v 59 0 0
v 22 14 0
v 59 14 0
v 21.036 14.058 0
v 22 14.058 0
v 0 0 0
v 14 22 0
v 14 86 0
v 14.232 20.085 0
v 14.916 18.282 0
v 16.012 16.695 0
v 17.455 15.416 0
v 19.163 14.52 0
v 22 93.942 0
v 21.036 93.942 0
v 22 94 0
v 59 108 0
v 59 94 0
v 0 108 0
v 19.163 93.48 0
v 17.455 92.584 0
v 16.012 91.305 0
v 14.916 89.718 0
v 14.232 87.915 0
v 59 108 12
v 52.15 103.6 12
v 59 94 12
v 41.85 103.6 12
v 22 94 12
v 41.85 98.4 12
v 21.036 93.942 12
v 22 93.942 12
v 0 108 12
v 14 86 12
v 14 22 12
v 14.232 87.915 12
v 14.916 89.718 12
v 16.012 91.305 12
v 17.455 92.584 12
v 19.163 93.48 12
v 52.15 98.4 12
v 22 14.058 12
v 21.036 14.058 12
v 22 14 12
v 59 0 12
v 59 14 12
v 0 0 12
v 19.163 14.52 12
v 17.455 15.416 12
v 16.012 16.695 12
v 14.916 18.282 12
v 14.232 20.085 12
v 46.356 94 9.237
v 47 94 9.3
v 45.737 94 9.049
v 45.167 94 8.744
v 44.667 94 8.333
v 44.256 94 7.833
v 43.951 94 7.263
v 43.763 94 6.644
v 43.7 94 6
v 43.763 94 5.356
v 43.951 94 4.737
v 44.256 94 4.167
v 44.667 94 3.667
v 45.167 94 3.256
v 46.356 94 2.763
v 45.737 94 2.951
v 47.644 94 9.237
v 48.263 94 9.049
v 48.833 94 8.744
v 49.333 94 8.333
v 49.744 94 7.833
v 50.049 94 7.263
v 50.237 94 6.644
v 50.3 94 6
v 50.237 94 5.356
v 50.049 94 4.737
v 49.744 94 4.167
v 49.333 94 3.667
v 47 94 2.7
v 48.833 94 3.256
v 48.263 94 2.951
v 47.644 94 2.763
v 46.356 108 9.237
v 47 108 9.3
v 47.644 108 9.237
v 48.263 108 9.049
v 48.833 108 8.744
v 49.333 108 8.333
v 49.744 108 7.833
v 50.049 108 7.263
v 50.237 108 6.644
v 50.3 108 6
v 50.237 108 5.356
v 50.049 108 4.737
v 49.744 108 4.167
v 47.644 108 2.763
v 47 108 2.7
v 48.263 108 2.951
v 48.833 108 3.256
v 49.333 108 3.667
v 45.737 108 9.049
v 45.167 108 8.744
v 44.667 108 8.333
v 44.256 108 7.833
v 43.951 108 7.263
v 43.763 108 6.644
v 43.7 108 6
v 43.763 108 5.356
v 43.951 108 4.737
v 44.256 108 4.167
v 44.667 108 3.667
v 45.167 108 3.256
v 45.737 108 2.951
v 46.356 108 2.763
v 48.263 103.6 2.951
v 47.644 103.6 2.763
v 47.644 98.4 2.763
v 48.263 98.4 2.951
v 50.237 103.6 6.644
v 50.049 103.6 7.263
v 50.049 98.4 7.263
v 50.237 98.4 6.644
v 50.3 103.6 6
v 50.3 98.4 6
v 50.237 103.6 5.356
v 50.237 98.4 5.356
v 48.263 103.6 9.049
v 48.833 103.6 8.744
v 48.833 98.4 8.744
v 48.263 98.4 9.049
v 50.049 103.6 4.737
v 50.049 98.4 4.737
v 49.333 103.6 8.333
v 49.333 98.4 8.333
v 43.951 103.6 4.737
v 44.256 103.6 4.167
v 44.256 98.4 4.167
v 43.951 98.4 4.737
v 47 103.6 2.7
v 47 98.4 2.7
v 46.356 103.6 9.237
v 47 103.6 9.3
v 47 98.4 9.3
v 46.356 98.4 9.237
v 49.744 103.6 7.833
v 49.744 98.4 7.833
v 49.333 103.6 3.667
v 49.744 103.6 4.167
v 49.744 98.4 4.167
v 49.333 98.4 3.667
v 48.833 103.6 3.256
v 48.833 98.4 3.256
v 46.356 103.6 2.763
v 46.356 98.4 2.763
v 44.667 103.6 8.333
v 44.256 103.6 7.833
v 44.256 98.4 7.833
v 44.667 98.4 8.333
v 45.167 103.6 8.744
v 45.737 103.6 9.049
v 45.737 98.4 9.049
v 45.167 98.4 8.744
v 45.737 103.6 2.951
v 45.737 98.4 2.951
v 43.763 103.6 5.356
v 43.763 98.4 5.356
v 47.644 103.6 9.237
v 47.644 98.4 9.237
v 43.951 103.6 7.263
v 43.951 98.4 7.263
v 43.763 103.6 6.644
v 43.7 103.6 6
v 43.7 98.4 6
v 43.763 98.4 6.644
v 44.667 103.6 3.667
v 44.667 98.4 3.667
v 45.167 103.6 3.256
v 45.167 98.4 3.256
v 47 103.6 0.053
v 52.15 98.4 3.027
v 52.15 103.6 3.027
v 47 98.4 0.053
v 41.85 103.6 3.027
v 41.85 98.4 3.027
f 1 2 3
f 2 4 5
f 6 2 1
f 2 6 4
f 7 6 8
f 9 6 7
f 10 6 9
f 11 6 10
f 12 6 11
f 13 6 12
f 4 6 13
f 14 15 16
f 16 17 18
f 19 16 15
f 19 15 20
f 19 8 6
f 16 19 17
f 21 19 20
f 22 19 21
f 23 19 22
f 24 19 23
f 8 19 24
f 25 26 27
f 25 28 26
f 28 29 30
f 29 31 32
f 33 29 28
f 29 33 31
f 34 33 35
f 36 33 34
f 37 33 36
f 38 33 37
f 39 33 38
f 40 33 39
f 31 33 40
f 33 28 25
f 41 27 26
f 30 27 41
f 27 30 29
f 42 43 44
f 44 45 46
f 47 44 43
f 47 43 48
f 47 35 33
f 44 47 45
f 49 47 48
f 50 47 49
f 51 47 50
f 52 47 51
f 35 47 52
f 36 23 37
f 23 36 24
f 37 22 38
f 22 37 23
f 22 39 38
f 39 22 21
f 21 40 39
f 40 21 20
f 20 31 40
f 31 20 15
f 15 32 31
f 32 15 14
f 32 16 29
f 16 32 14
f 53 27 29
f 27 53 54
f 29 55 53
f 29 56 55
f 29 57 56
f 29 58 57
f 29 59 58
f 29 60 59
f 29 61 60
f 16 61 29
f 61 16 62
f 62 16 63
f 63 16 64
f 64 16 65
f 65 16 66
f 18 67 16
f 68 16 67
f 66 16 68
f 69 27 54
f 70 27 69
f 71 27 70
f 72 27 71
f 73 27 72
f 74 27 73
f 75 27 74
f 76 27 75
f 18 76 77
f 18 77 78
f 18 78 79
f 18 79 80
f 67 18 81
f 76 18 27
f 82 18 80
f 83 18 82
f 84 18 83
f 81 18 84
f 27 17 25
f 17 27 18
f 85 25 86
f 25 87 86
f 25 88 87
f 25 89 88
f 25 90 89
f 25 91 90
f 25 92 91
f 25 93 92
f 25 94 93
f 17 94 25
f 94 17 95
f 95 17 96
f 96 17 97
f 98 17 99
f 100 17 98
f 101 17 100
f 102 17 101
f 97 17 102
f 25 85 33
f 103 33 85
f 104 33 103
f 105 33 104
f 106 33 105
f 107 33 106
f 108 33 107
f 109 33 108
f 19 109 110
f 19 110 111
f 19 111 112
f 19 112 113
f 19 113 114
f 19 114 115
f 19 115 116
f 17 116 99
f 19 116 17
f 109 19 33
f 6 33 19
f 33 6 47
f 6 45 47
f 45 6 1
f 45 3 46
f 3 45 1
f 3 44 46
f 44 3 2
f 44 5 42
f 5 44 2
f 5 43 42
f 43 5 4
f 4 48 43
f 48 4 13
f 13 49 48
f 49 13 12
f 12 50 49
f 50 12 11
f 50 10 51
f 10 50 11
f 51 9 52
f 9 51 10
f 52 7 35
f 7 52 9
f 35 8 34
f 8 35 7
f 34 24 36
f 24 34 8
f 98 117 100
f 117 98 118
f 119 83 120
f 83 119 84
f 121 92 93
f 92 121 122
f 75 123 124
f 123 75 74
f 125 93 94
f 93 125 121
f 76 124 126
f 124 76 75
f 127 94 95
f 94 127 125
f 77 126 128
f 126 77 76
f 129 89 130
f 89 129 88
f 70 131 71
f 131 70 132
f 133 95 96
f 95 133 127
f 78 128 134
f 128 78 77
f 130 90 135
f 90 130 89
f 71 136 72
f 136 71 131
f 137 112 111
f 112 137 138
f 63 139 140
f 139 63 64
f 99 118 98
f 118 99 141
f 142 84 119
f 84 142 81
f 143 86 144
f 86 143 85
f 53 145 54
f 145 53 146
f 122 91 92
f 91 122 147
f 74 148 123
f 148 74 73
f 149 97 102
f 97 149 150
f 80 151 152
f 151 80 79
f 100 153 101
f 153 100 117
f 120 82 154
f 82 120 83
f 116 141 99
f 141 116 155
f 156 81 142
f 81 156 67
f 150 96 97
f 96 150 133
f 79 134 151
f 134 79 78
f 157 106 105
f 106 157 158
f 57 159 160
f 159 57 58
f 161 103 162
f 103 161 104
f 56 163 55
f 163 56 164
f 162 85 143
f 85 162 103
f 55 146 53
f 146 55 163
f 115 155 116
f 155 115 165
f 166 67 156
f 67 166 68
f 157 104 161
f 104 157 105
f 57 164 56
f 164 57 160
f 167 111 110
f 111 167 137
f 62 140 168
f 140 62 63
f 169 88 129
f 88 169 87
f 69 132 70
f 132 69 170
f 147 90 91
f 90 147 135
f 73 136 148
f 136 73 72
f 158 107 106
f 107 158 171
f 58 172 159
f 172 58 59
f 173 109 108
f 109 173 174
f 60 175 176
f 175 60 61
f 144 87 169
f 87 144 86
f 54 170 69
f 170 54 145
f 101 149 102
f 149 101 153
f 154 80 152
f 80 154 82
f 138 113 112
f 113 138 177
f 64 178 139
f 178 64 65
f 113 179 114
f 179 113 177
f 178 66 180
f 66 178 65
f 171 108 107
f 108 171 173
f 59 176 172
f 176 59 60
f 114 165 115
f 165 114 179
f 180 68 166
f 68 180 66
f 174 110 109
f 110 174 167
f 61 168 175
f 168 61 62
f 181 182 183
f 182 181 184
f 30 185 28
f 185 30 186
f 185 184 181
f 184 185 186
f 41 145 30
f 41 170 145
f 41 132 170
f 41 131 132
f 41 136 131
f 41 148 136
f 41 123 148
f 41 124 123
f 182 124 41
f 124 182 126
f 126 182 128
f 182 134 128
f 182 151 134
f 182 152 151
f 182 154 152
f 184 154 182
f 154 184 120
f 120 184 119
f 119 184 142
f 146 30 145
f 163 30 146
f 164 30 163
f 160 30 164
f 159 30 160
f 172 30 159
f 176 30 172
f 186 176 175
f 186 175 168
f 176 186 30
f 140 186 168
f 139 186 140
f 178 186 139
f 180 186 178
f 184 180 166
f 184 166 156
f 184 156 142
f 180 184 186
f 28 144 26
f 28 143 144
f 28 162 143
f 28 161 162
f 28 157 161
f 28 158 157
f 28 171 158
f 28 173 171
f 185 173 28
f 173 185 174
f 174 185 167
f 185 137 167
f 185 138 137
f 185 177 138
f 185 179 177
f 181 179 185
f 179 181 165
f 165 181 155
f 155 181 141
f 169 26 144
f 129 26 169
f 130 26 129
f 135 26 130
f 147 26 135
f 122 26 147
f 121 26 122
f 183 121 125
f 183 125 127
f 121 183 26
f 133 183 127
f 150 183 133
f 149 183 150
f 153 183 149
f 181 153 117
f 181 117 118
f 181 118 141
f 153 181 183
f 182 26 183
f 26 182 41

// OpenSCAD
// Moldmaker universal C-clamp. Print flat, PETG. M6 rod, no printed threads.
throat=80; depth=45; part="frame"; // frame | knob | pad | assembly
t=12; bar=14; nutAF=10+0.3; nutH=5.2; hole=6.6;
W=throat+2*bar;
module frame(){ difference(){
  linear_extrude(t) difference(){
    union(){ square([bar+depth,bar]); translate([0,W-bar]) square([bar+depth,bar]); square([bar,W]);
      translate([bar,bar]) difference(){square(8);translate([8,8])circle(8);}
      translate([bar,W-bar-8]) difference(){square(8);translate([8,0])circle(8);} }
  }
  // M6 clearance through top jaw (along -Y) + captive nut pocket
  translate([bar+depth-12,W+1,t/2]) rotate([90,0,0]) cylinder(d=hole,h=bar+2,$fn=32);
  translate([bar+depth-12,W-bar/2,t/2]) rotate([90,0,0]) rotate(30) cylinder(d=nutAF/cos(30),h=nutH,center=true,$fn=6);
  translate([bar+depth-12-nutAF/2,W-bar/2-nutH/2,t/2]) cube([nutAF,nutH,t]); // slide-in from top face
}}
module knob(){ difference(){ union(){ cylinder(d=36,h=12,$fn=12); }
  translate([0,0,-1]) cylinder(d=hole,h=20,$fn=32);
  translate([0,0,12-6]) cylinder(d=nutAF/cos(30),h=7,$fn=6);}}
module pad(){ difference(){ cylinder(d=24,h=6,$fn=64);
  translate([0,0,2]) cylinder(d=6.4,h=5,$fn=32);}
  for(a=[0:90:270]) rotate(a) translate([0,3.5,4]) cube([0.8,1.2,3],center=true); }
if(part=="frame") frame(); else if(part=="knob") knob(); else if(part=="pad") pad();
else { frame(); %translate([bar+depth-12-30,bar,-5]) cube([45,throat-5,22]);
  color("silver") translate([bar+depth-12,W+20,t/2]) rotate([90,0,0]) cylinder(d=6,h=bar+20+throat-10,$fn=24);
  color("orange") translate([bar+depth-12,W+20,t/2]) rotate([-90,0,0]) knob();
  color("green") translate([bar+depth-12,bar+5+6,t/2]) rotate([90,0,0]) pad(); }
